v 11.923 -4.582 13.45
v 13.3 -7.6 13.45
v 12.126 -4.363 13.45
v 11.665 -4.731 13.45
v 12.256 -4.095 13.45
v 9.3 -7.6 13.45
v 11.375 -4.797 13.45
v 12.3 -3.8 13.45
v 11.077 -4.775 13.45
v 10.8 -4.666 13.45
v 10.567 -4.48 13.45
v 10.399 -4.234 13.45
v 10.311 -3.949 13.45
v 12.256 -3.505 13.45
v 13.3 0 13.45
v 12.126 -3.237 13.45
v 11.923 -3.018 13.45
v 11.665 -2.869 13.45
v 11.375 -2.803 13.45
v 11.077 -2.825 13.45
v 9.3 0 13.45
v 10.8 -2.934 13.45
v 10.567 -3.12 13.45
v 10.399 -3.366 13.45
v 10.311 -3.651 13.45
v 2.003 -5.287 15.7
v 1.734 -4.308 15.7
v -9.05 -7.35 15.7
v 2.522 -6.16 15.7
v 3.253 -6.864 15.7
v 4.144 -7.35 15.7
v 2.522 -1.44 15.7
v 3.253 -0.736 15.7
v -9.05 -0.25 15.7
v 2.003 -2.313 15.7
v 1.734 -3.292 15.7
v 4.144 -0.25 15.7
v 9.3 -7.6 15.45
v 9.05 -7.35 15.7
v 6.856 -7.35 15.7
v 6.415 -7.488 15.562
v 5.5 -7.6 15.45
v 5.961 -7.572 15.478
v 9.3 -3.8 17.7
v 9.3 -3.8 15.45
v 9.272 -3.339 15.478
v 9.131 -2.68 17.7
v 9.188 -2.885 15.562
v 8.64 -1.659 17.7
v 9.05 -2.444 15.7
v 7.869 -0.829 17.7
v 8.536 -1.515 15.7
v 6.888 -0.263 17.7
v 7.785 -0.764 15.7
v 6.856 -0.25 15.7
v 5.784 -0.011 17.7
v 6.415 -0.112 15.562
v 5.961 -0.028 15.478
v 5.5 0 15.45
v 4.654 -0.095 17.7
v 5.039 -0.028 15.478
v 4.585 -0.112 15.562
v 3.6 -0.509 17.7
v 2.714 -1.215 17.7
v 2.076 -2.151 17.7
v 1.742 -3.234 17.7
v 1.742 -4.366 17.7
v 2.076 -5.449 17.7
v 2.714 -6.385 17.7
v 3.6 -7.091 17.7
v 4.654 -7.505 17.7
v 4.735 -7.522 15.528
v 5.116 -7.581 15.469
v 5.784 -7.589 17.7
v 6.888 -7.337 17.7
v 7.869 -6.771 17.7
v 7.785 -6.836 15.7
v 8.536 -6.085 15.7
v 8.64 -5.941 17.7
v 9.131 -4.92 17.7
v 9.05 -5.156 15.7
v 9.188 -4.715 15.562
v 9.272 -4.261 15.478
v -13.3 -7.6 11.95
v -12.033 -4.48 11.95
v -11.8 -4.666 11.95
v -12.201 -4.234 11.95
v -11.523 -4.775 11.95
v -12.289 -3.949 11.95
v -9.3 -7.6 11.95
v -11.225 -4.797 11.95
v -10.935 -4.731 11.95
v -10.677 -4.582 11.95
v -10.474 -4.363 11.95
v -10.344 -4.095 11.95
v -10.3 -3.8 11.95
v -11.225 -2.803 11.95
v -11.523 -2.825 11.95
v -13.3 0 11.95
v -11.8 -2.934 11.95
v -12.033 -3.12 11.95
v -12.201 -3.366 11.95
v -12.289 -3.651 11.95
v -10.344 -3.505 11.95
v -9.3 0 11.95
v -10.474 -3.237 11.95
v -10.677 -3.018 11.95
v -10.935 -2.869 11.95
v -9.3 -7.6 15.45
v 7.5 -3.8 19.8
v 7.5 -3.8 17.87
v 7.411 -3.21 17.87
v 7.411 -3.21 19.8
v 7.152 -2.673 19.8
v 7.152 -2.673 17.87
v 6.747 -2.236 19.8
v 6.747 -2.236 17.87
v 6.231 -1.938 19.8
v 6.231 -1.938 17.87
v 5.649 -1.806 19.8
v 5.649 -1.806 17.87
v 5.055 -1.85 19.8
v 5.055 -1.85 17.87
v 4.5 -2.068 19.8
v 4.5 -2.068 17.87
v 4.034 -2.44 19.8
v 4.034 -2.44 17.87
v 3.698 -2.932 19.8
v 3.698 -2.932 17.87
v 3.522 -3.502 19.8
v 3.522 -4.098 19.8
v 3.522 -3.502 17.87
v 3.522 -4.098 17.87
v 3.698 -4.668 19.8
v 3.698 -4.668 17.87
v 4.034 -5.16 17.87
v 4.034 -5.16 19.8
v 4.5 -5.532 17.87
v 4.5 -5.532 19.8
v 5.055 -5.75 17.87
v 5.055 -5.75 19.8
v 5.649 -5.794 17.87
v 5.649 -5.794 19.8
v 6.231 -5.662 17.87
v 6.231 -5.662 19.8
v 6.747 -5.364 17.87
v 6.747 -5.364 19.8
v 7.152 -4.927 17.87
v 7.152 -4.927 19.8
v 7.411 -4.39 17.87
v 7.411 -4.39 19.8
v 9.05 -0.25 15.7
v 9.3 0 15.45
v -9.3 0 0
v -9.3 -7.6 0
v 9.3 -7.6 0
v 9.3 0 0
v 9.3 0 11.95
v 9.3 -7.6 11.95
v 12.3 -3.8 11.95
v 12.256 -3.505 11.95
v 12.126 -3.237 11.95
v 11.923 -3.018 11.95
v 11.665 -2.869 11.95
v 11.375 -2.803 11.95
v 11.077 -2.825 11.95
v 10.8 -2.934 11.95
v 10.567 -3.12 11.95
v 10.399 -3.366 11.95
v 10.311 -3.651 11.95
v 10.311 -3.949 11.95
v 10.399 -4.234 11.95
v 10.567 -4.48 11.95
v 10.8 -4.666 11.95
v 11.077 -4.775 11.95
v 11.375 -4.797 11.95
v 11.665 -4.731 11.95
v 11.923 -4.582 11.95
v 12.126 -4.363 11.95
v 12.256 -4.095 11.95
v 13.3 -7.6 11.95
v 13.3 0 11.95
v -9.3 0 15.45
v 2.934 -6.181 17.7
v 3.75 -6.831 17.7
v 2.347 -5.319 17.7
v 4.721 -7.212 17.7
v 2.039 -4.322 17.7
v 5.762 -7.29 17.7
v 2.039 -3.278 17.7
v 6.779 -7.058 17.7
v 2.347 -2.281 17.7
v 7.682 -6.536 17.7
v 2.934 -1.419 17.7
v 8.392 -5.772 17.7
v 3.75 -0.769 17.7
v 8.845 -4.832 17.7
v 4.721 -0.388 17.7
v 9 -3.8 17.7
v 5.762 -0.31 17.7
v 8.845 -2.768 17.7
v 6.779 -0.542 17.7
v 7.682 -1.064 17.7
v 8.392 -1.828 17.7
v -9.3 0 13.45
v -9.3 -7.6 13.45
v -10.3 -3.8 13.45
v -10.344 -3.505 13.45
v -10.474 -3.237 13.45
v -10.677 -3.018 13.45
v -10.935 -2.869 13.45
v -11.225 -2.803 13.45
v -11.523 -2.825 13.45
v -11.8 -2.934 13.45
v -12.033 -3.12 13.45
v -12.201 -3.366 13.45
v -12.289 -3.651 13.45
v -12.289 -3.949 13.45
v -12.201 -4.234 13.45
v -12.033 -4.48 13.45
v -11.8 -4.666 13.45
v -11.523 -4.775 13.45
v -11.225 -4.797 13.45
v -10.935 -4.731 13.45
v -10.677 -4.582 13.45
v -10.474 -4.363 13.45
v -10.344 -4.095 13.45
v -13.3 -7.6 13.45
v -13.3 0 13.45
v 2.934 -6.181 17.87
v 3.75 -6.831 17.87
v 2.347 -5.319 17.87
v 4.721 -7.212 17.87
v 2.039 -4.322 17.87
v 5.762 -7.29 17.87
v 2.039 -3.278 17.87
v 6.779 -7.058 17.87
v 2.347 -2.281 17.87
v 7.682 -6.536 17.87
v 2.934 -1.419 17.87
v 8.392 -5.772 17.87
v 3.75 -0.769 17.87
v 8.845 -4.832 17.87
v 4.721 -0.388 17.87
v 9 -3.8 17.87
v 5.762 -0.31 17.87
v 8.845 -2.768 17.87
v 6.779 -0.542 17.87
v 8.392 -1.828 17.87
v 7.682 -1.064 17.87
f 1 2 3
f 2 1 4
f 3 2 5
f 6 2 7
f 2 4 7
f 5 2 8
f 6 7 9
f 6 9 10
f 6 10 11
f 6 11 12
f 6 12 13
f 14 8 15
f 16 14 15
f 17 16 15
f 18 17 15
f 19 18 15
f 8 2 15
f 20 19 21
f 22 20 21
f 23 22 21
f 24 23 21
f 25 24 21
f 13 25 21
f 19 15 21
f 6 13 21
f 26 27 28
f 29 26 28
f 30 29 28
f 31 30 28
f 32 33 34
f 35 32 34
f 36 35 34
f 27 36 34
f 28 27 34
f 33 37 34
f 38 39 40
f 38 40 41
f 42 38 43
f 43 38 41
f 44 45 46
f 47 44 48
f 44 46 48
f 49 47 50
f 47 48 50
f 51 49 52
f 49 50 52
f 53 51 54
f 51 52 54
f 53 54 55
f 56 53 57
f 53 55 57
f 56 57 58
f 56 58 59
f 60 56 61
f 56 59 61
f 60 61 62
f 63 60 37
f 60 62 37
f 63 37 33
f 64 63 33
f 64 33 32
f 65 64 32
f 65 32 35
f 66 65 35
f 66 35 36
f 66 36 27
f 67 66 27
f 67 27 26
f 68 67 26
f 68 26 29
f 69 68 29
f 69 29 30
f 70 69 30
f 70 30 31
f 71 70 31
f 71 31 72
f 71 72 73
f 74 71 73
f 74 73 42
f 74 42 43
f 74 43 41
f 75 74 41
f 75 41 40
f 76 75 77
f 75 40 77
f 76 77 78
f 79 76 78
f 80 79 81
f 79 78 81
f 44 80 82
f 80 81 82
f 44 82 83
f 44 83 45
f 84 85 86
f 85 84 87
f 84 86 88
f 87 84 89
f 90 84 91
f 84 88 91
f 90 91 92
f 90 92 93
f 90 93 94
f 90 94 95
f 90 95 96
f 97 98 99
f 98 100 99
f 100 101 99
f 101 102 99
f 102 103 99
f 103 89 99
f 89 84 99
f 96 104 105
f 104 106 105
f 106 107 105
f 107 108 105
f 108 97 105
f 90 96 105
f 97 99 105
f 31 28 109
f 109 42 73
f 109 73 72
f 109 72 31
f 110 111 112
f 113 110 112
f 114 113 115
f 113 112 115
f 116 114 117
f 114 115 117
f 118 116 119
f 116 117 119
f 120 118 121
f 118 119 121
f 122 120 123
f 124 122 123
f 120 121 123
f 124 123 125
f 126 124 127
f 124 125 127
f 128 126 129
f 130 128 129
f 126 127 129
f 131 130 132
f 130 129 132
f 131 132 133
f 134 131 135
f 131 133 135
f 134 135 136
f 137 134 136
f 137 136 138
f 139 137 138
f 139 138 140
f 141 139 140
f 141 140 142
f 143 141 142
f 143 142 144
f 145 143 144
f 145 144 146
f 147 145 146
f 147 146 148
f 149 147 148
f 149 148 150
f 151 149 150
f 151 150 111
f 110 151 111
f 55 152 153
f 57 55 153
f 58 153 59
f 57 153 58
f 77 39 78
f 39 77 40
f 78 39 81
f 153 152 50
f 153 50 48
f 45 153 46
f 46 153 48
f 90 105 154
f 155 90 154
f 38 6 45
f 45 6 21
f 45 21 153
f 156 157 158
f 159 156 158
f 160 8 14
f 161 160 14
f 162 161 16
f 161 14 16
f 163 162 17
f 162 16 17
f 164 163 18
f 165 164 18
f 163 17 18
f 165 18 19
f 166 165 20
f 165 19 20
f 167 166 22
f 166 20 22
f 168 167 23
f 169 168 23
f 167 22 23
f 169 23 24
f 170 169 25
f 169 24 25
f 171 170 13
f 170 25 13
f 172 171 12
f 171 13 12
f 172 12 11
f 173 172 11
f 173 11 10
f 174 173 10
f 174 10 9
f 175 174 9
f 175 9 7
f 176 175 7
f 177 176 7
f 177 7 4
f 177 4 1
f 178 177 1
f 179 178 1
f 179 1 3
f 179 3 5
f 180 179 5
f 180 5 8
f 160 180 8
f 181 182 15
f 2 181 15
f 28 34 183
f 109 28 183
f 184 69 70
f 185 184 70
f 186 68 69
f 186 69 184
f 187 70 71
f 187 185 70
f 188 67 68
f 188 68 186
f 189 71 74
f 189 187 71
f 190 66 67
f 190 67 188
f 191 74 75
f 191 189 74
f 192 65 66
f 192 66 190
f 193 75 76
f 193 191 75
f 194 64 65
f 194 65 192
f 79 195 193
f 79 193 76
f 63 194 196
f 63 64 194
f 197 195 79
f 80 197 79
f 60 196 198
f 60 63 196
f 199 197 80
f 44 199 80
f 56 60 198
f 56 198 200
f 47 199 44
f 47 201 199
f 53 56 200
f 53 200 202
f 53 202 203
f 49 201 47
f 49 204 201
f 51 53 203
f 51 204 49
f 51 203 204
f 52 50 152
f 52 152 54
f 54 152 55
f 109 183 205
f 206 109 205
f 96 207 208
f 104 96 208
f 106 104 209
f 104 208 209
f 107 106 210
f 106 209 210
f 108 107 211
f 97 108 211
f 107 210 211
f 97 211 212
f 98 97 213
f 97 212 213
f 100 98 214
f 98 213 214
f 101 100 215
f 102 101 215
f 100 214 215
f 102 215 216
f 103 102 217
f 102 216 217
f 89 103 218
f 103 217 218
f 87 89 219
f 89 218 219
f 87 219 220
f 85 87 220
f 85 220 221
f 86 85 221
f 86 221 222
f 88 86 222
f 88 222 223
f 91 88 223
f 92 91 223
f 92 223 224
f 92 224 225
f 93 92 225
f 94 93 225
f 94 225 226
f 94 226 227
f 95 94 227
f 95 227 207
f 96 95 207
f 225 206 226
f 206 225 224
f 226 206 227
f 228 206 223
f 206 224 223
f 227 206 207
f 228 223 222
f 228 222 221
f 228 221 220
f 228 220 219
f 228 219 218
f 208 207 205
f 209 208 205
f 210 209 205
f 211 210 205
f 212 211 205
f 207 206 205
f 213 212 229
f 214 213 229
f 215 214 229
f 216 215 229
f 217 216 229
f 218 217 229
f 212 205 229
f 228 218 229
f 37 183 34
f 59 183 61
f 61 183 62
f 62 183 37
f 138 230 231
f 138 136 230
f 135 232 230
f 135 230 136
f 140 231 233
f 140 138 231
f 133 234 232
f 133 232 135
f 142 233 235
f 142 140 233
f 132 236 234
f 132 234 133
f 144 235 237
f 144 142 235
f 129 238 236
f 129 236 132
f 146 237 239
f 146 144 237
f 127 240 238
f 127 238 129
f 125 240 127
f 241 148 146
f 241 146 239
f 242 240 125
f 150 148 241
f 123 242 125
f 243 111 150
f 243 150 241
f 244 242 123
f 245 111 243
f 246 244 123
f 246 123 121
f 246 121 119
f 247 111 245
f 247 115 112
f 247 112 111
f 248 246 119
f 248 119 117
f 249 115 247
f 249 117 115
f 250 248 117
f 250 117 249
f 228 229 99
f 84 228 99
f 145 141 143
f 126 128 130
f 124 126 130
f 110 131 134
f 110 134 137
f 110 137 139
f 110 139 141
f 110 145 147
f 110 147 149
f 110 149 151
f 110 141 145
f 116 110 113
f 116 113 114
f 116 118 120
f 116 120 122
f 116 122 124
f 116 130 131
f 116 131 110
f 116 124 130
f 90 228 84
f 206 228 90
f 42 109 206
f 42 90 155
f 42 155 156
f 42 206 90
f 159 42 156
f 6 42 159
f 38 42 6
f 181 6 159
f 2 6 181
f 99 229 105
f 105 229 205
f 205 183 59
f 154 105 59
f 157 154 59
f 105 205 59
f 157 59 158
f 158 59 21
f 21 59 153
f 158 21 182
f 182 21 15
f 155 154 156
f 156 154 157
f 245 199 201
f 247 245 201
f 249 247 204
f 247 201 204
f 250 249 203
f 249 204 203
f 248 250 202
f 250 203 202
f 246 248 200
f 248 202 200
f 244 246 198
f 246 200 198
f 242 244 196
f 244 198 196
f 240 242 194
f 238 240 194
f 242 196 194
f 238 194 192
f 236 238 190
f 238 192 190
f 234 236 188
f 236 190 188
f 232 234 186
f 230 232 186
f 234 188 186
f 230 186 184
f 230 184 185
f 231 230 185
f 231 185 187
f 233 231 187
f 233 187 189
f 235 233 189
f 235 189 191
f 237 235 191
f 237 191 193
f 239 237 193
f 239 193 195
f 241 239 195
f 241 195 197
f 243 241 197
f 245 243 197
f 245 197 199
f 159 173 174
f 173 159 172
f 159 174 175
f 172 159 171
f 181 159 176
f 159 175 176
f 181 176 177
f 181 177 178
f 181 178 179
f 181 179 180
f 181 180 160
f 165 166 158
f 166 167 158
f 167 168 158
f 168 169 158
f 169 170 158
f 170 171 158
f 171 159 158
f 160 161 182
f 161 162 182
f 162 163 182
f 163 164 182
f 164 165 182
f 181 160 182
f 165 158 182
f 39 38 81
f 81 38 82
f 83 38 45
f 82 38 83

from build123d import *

# Parameters (mm, degrees)
F1_DEPTH     = 7.6
F2_R         = 1
F3_DEPTH     = 13.451
F4_R         = 3.8
F4_R_2       = 3.5
F4_R_3       = 2
F5_DEPTH     = 2
F6_DEPTH     = 2.17
F7_DEPTH     = 4.1
F8_T1_DEPTH  = 8.885841494
F8_T6_DEPTH  = 15.442920747
F8_S7_R      = 3.8
F8_T8_DEPTH  = 9
F8_T12_DEPTH = 15.442920747
F8_S13_R     = 3.8
F8_T14_DEPTH = 9
F8_T18_DEPTH = 4.442920747
F8_S19_R     = 3.8
F8_T20_DEPTH = 4
F8_T24_DEPTH = 4.442920747
F8_S25_R     = 3.8
F8_T26_DEPTH = 4
F8_T30_DEPTH = 4.442920747
F8_S31_R     = 3.8
F8_T32_DEPTH = 4
F8_T36_DEPTH = 4.442920747
F8_S37_R     = 3.8
F8_T38_DEPTH = 4


# Not quite as in the source:
# - a fillet or chamfer that OpenCascade refuses, or shapes differently, is made with other operations: its cross-section is extruded or revolved along the edge and cut away or added


with BuildPart() as f1:
    # F0 (on Front) → F1 (new body)
    with BuildSketch(Plane.XZ):
        Polygon((9.3, 15.7), (-9.3, 15.7), (-9.3, 13.45), (-13.3, 13.45), (-13.3, 11.95), (-9.3, 11.95), (-9.3, 0), (9.3, 0), (9.3, 11.95), (13.3, 11.95), (13.3, 13.45), (9.3, 13.45), align=None)
    extrude(amount=F1_DEPTH)

    # F2 (on face) → F3 (cut, through all)
    with BuildSketch(Plane.XY.offset(13.45)):
        with Locations((-11.3, -3.8)):
            Circle(F2_R)
        with Locations((11.3, -3.8)):
            Circle(F2_R)
    extrude(amount=-F3_DEPTH, mode=Mode.SUBTRACT)

    # F4 (on face) → F5 (join)
    with BuildSketch(Plane.XY.offset(15.7)):
        with Locations((5.5, -3.8)):
            Circle(F4_R)
        with Locations((5.5, -3.8)):
            Circle(F4_R_2, mode=Mode.SUBTRACT)
        with Locations((5.5, -3.8)):
            Circle(F4_R_2)
        with Locations((5.5, -3.8)):
            Circle(F4_R_3, mode=Mode.SUBTRACT)
        with Locations((5.5, -3.8)):
            Circle(F4_R_3)
    extrude(amount=F5_DEPTH)

    # F4 (on face) → F6 (join)
    with BuildSketch(Plane.XY.offset(15.7)):
        with Locations((5.5, -3.8)):
            Circle(F4_R_2)
        with Locations((5.5, -3.8)):
            Circle(F4_R_3, mode=Mode.SUBTRACT)
        with Locations((5.5, -3.8)):
            Circle(F4_R_3)
    extrude(amount=F6_DEPTH)

    # F4 (on face) → F7 (join)
    with BuildSketch(Plane.XY.offset(15.7)):
        with Locations((5.5, -3.8)):
            Circle(F4_R_3)
    extrude(amount=F7_DEPTH)

    # F8: chamfer of 0.25 on 7 edges, made by hand

    # F8_s2 → F8_t1 (cut)
    with BuildSketch(Plane.XZ.offset(-0.642920747)):
        Polygon((-9.05, 15.7), (-9.3, 15.45), (-9.3, 15.7), align=None)
    extrude(amount=F8_T1_DEPTH, mode=Mode.SUBTRACT)


with BuildPart() as f8_tool4:
    # F8_s5 → F8_t6 (new body)
    with BuildSketch(Plane.YZ.offset(5.5)):
        Polygon((-7.35, 15.7), (-7.6, 15.45), (-7.6, 15.7), align=None)
    extrude(amount=-F8_T6_DEPTH)

    # F8_s7 → F8_t8 (cut, symmetric)
    with BuildSketch(Plane.XY.offset(15.6)):
        with Locations((5.5, -3.8)):
            Circle(F8_S7_R)
    extrude(amount=F8_T8_DEPTH, both=True, mode=Mode.SUBTRACT)


with BuildPart() as f1_1:
    add(f1.part)

    # F8_t3: cut F8_tool4
    add(f8_tool4.part, mode=Mode.SUBTRACT)


with BuildPart() as f8_tool10:
    # F8_s11 → F8_t12 (new body)
    with BuildSketch(Plane.YZ.offset(5.5)):
        Polygon((0, 15.45), (-0.25, 15.7), (0, 15.7), align=None)
    extrude(amount=-F8_T12_DEPTH)

    # F8_s13 → F8_t14 (cut, symmetric)
    with BuildSketch(Plane.XY.offset(15.6)):
        with Locations((5.5, -3.8)):
            Circle(F8_S13_R)
    extrude(amount=F8_T14_DEPTH, both=True, mode=Mode.SUBTRACT)


with BuildPart() as f1_2:
    add(f1_1.part)

    # F8_t9: cut F8_tool10
    add(f8_tool10.part, mode=Mode.SUBTRACT)


with BuildPart() as f8_tool16:
    # F8_s17 → F8_t18 (new body)
    with BuildSketch(Plane.XZ.offset(3.8)):
        Polygon((9.3, 15.45), (9.05, 15.7), (9.3, 15.7), align=None)
    extrude(amount=F8_T18_DEPTH)

    # F8_s19 → F8_t20 (cut, symmetric)
    with BuildSketch(Plane.XY.offset(15.6)):
        with Locations((5.5, -3.8)):
            Circle(F8_S19_R)
    extrude(amount=F8_T20_DEPTH, both=True, mode=Mode.SUBTRACT)


with BuildPart() as f1_3:
    add(f1_2.part)

    # F8_t15: cut F8_tool16
    add(f8_tool16.part, mode=Mode.SUBTRACT)


with BuildPart() as f8_tool22:
    # F8_s23 → F8_t24 (new body)
    with BuildSketch(Plane.YZ.offset(9.942920747)):
        Polygon((-0.25, 15.7), (0, 15.45), (0, 15.7), align=None)
    extrude(amount=-F8_T24_DEPTH)

    # F8_s25 → F8_t26 (cut, symmetric)
    with BuildSketch(Plane.XY.offset(15.6)):
        with Locations((5.5, -3.8)):
            Circle(F8_S25_R)
    extrude(amount=F8_T26_DEPTH, both=True, mode=Mode.SUBTRACT)


with BuildPart() as f1_4:
    add(f1_3.part)

    # F8_t21: cut F8_tool22
    add(f8_tool22.part, mode=Mode.SUBTRACT)


with BuildPart() as f8_tool28:
    # F8_s29 → F8_t30 (new body)
    with BuildSketch(Plane.XZ.offset(-0.642920747)):
        Polygon((9.05, 15.7), (9.3, 15.45), (9.3, 15.7), align=None)
    extrude(amount=F8_T30_DEPTH)

    # F8_s31 → F8_t32 (cut, symmetric)
    with BuildSketch(Plane.XY.offset(15.6)):
        with Locations((5.5, -3.8)):
            Circle(F8_S31_R)
    extrude(amount=F8_T32_DEPTH, both=True, mode=Mode.SUBTRACT)


with BuildPart() as f1_5:
    add(f1_4.part)

    # F8_t27: cut F8_tool28
    add(f8_tool28.part, mode=Mode.SUBTRACT)


with BuildPart() as f8_tool34:
    # F8_s35 → F8_t36 (new body)
    with BuildSketch(Plane.YZ.offset(9.942920747)):
        Polygon((-7.35, 15.7), (-7.6, 15.45), (-7.6, 15.7), align=None)
    extrude(amount=-F8_T36_DEPTH)

    # F8_s37 → F8_t38 (cut, symmetric)
    with BuildSketch(Plane.XY.offset(15.6)):
        with Locations((5.5, -3.8)):
            Circle(F8_S37_R)
    extrude(amount=F8_T38_DEPTH, both=True, mode=Mode.SUBTRACT)


with BuildPart() as f1_6:
    add(f1_5.part)

    # F8_t33: cut F8_tool34
    add(f8_tool34.part, mode=Mode.SUBTRACT)


solid = f1_6.part
